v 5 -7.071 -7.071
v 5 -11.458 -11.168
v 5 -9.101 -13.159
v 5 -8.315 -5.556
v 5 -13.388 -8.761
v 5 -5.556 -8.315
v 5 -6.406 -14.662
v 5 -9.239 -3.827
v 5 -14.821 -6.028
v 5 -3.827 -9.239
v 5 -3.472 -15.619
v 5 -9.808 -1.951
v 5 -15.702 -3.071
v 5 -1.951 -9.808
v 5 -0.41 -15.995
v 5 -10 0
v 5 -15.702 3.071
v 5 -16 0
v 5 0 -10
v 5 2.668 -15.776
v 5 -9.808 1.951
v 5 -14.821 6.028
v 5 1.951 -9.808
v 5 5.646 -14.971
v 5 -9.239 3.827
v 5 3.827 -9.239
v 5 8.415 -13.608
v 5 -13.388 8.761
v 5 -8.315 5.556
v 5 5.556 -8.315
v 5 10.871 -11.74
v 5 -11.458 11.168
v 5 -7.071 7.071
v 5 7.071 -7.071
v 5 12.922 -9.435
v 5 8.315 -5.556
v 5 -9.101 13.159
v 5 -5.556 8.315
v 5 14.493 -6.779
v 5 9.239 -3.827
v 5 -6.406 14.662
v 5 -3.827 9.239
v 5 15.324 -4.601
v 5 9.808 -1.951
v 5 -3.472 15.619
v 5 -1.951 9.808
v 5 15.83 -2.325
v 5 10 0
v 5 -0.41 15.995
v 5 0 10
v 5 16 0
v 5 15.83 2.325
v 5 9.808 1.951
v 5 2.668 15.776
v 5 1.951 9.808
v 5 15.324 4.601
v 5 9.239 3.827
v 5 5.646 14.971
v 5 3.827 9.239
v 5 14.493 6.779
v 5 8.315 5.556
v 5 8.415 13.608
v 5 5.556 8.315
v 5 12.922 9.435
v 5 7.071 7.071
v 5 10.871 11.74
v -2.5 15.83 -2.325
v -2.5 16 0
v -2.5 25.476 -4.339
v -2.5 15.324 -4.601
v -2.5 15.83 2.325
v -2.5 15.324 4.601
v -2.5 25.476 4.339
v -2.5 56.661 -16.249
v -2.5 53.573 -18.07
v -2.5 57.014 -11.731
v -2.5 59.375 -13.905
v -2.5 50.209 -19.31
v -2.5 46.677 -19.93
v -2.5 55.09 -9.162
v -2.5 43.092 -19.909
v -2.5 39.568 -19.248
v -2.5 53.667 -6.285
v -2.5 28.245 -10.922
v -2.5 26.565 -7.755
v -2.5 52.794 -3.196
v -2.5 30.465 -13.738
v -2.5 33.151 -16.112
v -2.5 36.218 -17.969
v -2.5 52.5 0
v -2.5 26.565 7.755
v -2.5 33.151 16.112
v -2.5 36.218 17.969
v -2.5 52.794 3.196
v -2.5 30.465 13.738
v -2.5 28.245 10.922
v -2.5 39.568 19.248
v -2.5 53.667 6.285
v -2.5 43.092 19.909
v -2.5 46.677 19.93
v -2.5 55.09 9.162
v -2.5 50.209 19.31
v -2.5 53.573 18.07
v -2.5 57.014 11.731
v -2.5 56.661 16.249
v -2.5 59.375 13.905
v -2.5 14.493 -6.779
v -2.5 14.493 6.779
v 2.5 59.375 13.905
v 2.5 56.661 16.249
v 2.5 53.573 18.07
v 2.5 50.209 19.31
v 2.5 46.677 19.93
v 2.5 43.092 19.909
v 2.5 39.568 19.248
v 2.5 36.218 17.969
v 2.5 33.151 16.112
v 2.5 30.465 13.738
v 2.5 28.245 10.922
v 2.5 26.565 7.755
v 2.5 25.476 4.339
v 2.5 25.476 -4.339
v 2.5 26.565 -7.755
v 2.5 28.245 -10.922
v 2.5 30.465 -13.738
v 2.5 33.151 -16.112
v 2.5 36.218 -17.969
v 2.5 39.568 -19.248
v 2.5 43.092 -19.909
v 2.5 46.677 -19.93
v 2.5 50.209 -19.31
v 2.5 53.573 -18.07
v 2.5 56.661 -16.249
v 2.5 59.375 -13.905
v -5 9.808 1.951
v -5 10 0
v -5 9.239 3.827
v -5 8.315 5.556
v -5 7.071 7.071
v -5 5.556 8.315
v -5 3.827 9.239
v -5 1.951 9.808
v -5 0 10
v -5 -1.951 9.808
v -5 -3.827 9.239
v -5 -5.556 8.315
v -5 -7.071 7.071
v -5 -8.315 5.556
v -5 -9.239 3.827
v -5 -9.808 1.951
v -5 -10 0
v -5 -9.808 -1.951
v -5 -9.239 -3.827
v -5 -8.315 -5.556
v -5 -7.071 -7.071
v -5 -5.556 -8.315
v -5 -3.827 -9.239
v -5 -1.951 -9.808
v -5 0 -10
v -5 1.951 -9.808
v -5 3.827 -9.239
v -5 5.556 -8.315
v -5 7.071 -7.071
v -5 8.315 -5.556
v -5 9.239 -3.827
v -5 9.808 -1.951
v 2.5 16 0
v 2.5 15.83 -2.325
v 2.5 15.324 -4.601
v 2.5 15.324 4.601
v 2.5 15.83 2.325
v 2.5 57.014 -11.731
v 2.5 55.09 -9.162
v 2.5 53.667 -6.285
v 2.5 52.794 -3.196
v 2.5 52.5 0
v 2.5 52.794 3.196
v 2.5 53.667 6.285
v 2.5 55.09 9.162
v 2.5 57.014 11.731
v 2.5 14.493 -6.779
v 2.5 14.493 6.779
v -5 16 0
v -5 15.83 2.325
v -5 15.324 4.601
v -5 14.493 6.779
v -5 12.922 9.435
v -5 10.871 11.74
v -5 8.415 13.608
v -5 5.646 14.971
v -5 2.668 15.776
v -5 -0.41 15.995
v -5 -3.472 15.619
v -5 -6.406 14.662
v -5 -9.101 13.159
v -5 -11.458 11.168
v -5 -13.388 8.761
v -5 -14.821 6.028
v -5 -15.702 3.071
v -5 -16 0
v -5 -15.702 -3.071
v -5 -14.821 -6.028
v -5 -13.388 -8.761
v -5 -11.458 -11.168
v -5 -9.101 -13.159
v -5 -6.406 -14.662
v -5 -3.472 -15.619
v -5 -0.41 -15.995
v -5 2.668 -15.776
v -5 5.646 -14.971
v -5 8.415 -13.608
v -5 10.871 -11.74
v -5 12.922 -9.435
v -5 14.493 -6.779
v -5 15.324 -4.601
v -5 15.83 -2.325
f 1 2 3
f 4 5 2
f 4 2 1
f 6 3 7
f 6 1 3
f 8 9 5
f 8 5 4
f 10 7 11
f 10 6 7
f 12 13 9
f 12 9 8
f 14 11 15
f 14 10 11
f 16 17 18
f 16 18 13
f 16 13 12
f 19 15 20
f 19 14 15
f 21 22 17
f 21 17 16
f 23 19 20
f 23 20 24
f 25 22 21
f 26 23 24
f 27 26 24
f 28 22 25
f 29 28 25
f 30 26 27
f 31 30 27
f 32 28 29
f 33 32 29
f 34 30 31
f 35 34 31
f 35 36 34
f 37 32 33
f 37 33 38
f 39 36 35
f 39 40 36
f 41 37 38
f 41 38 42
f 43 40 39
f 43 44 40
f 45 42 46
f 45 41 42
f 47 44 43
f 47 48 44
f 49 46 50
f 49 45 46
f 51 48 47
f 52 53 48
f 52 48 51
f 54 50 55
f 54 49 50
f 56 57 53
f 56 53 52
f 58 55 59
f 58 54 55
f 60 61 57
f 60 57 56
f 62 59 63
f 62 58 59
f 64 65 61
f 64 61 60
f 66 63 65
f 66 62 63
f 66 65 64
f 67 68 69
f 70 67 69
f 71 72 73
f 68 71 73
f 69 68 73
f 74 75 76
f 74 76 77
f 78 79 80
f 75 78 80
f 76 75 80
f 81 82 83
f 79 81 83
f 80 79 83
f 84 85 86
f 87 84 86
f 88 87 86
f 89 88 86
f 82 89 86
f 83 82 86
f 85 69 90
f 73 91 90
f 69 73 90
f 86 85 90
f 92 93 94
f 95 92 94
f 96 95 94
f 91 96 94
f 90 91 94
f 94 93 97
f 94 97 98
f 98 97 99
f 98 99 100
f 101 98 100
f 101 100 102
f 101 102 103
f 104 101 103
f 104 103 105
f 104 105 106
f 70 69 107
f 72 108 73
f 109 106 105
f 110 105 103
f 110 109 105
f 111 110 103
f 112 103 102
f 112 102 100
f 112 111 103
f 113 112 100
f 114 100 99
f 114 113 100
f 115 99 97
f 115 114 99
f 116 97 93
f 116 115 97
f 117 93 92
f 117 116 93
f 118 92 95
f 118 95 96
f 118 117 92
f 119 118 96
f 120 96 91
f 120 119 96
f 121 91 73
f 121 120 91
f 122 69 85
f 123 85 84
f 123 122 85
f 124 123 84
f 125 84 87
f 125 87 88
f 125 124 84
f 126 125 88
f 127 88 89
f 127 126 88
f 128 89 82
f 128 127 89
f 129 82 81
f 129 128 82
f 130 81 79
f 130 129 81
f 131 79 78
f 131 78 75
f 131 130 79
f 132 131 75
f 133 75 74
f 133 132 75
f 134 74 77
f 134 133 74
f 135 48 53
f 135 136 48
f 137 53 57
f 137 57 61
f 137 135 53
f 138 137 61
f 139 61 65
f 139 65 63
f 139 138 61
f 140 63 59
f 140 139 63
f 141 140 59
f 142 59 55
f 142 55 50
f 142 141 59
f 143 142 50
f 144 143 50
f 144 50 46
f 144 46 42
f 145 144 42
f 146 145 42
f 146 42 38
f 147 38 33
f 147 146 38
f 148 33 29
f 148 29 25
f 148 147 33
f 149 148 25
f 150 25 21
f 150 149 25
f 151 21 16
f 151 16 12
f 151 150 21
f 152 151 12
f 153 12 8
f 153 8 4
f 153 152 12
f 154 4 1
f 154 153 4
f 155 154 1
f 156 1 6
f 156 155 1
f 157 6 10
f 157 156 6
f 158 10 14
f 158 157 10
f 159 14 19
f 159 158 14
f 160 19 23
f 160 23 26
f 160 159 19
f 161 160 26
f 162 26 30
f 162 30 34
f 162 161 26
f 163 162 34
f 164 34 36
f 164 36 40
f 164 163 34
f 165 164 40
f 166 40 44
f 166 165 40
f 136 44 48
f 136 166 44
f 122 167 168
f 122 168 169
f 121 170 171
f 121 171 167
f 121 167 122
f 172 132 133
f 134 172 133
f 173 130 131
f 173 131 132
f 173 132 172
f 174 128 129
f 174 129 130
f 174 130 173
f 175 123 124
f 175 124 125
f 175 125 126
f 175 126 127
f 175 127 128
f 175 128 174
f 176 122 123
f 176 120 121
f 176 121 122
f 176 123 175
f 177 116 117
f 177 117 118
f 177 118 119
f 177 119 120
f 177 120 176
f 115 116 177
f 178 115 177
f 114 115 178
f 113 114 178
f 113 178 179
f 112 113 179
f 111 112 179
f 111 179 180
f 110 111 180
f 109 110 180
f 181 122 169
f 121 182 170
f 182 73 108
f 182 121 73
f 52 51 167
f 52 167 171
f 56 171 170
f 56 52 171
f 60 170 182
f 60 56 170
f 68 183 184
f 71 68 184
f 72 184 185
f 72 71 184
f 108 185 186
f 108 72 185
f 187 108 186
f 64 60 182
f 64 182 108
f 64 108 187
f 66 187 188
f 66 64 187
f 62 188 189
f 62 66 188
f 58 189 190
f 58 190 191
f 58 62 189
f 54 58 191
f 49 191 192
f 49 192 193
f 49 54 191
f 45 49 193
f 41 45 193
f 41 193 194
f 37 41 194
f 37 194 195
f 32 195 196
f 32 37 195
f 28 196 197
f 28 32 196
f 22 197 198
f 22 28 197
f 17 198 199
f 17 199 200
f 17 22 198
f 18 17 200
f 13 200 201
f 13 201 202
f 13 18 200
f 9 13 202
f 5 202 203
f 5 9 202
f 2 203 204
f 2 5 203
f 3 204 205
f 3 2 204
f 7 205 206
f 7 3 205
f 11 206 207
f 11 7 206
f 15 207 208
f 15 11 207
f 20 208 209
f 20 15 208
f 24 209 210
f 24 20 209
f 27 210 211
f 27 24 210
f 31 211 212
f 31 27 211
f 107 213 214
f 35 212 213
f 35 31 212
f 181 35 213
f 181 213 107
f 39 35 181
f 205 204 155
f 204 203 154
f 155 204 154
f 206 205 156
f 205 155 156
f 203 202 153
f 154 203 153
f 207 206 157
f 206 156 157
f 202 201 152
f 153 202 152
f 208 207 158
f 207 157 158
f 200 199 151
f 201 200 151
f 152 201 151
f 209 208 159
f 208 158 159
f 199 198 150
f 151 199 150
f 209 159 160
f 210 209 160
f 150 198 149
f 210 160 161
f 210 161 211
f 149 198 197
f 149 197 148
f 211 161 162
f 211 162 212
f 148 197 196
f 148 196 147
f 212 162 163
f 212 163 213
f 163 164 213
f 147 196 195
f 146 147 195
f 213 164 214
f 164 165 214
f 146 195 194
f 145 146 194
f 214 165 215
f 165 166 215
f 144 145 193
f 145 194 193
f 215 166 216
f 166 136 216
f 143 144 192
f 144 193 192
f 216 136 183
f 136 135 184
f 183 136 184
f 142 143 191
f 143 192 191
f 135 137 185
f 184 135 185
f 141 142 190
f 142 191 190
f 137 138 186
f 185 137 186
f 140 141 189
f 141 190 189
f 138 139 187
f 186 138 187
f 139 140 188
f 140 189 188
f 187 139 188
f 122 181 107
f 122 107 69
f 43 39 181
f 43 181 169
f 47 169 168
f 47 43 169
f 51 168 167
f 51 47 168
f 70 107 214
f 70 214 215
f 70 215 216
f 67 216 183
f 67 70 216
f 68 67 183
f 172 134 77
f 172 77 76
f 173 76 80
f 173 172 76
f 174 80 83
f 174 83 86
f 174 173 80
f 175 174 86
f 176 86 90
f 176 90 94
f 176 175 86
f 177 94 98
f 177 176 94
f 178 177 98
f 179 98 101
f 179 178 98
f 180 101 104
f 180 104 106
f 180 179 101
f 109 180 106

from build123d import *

# Parameters (mm, degrees)
F0_R     = 10
F1_DEPTH = 5
F2_DEPTH = 5
F3_DEPTH = 2.5


with BuildPart() as f1:
    # F0 (on Right) → F1 (new body, symmetric)
    with BuildSketch(Plane.YZ):
        Circle(F0_R)
        with BuildLine():
            ThreePointArc((14.492753, -6.779388), (15.618644, -3.472459), (16, 0))
            ThreePointArc((16, 0), (15.618644, 3.472459), (14.492753, 6.779388))
            ThreePointArc((14.492753, 6.779388), (-16, 0), (14.492753, -6.779388))
        make_face()
        Circle(F0_R, mode=Mode.SUBTRACT)
    extrude(amount=F1_DEPTH, both=True)

    # F0 (on Right) → F2 (cut, symmetric)
    with BuildSketch(Plane.YZ):
        Circle(F0_R)
    extrude(amount=F2_DEPTH, both=True, mode=Mode.SUBTRACT)

    # F0 (on Right) → F3 (join, symmetric)
    with BuildSketch(Plane.YZ):
        with BuildLine():
            ThreePointArc((14.492753, 6.779388), (15.618644, 3.472459), (16, 0))
            ThreePointArc((16, 0), (15.618644, -3.472459), (14.492753, -6.779388))
            Line((14.492753, -6.779388), (25.476259, -4.338609))
            ThreePointArc((25.476259, -4.338609), (39.567862, -19.248166), (59.375, -13.905372))
            ThreePointArc((59.375, -13.905372), (52.5, 0), (59.375, 13.905372))
            ThreePointArc((59.375, 13.905372), (39.567862, 19.248166), (25.476259, 4.338609))
            Line((25.476259, 4.338609), (14.492753, 6.779388))
        make_face()
    extrude(amount=F3_DEPTH, both=True)


solid = f1.part
